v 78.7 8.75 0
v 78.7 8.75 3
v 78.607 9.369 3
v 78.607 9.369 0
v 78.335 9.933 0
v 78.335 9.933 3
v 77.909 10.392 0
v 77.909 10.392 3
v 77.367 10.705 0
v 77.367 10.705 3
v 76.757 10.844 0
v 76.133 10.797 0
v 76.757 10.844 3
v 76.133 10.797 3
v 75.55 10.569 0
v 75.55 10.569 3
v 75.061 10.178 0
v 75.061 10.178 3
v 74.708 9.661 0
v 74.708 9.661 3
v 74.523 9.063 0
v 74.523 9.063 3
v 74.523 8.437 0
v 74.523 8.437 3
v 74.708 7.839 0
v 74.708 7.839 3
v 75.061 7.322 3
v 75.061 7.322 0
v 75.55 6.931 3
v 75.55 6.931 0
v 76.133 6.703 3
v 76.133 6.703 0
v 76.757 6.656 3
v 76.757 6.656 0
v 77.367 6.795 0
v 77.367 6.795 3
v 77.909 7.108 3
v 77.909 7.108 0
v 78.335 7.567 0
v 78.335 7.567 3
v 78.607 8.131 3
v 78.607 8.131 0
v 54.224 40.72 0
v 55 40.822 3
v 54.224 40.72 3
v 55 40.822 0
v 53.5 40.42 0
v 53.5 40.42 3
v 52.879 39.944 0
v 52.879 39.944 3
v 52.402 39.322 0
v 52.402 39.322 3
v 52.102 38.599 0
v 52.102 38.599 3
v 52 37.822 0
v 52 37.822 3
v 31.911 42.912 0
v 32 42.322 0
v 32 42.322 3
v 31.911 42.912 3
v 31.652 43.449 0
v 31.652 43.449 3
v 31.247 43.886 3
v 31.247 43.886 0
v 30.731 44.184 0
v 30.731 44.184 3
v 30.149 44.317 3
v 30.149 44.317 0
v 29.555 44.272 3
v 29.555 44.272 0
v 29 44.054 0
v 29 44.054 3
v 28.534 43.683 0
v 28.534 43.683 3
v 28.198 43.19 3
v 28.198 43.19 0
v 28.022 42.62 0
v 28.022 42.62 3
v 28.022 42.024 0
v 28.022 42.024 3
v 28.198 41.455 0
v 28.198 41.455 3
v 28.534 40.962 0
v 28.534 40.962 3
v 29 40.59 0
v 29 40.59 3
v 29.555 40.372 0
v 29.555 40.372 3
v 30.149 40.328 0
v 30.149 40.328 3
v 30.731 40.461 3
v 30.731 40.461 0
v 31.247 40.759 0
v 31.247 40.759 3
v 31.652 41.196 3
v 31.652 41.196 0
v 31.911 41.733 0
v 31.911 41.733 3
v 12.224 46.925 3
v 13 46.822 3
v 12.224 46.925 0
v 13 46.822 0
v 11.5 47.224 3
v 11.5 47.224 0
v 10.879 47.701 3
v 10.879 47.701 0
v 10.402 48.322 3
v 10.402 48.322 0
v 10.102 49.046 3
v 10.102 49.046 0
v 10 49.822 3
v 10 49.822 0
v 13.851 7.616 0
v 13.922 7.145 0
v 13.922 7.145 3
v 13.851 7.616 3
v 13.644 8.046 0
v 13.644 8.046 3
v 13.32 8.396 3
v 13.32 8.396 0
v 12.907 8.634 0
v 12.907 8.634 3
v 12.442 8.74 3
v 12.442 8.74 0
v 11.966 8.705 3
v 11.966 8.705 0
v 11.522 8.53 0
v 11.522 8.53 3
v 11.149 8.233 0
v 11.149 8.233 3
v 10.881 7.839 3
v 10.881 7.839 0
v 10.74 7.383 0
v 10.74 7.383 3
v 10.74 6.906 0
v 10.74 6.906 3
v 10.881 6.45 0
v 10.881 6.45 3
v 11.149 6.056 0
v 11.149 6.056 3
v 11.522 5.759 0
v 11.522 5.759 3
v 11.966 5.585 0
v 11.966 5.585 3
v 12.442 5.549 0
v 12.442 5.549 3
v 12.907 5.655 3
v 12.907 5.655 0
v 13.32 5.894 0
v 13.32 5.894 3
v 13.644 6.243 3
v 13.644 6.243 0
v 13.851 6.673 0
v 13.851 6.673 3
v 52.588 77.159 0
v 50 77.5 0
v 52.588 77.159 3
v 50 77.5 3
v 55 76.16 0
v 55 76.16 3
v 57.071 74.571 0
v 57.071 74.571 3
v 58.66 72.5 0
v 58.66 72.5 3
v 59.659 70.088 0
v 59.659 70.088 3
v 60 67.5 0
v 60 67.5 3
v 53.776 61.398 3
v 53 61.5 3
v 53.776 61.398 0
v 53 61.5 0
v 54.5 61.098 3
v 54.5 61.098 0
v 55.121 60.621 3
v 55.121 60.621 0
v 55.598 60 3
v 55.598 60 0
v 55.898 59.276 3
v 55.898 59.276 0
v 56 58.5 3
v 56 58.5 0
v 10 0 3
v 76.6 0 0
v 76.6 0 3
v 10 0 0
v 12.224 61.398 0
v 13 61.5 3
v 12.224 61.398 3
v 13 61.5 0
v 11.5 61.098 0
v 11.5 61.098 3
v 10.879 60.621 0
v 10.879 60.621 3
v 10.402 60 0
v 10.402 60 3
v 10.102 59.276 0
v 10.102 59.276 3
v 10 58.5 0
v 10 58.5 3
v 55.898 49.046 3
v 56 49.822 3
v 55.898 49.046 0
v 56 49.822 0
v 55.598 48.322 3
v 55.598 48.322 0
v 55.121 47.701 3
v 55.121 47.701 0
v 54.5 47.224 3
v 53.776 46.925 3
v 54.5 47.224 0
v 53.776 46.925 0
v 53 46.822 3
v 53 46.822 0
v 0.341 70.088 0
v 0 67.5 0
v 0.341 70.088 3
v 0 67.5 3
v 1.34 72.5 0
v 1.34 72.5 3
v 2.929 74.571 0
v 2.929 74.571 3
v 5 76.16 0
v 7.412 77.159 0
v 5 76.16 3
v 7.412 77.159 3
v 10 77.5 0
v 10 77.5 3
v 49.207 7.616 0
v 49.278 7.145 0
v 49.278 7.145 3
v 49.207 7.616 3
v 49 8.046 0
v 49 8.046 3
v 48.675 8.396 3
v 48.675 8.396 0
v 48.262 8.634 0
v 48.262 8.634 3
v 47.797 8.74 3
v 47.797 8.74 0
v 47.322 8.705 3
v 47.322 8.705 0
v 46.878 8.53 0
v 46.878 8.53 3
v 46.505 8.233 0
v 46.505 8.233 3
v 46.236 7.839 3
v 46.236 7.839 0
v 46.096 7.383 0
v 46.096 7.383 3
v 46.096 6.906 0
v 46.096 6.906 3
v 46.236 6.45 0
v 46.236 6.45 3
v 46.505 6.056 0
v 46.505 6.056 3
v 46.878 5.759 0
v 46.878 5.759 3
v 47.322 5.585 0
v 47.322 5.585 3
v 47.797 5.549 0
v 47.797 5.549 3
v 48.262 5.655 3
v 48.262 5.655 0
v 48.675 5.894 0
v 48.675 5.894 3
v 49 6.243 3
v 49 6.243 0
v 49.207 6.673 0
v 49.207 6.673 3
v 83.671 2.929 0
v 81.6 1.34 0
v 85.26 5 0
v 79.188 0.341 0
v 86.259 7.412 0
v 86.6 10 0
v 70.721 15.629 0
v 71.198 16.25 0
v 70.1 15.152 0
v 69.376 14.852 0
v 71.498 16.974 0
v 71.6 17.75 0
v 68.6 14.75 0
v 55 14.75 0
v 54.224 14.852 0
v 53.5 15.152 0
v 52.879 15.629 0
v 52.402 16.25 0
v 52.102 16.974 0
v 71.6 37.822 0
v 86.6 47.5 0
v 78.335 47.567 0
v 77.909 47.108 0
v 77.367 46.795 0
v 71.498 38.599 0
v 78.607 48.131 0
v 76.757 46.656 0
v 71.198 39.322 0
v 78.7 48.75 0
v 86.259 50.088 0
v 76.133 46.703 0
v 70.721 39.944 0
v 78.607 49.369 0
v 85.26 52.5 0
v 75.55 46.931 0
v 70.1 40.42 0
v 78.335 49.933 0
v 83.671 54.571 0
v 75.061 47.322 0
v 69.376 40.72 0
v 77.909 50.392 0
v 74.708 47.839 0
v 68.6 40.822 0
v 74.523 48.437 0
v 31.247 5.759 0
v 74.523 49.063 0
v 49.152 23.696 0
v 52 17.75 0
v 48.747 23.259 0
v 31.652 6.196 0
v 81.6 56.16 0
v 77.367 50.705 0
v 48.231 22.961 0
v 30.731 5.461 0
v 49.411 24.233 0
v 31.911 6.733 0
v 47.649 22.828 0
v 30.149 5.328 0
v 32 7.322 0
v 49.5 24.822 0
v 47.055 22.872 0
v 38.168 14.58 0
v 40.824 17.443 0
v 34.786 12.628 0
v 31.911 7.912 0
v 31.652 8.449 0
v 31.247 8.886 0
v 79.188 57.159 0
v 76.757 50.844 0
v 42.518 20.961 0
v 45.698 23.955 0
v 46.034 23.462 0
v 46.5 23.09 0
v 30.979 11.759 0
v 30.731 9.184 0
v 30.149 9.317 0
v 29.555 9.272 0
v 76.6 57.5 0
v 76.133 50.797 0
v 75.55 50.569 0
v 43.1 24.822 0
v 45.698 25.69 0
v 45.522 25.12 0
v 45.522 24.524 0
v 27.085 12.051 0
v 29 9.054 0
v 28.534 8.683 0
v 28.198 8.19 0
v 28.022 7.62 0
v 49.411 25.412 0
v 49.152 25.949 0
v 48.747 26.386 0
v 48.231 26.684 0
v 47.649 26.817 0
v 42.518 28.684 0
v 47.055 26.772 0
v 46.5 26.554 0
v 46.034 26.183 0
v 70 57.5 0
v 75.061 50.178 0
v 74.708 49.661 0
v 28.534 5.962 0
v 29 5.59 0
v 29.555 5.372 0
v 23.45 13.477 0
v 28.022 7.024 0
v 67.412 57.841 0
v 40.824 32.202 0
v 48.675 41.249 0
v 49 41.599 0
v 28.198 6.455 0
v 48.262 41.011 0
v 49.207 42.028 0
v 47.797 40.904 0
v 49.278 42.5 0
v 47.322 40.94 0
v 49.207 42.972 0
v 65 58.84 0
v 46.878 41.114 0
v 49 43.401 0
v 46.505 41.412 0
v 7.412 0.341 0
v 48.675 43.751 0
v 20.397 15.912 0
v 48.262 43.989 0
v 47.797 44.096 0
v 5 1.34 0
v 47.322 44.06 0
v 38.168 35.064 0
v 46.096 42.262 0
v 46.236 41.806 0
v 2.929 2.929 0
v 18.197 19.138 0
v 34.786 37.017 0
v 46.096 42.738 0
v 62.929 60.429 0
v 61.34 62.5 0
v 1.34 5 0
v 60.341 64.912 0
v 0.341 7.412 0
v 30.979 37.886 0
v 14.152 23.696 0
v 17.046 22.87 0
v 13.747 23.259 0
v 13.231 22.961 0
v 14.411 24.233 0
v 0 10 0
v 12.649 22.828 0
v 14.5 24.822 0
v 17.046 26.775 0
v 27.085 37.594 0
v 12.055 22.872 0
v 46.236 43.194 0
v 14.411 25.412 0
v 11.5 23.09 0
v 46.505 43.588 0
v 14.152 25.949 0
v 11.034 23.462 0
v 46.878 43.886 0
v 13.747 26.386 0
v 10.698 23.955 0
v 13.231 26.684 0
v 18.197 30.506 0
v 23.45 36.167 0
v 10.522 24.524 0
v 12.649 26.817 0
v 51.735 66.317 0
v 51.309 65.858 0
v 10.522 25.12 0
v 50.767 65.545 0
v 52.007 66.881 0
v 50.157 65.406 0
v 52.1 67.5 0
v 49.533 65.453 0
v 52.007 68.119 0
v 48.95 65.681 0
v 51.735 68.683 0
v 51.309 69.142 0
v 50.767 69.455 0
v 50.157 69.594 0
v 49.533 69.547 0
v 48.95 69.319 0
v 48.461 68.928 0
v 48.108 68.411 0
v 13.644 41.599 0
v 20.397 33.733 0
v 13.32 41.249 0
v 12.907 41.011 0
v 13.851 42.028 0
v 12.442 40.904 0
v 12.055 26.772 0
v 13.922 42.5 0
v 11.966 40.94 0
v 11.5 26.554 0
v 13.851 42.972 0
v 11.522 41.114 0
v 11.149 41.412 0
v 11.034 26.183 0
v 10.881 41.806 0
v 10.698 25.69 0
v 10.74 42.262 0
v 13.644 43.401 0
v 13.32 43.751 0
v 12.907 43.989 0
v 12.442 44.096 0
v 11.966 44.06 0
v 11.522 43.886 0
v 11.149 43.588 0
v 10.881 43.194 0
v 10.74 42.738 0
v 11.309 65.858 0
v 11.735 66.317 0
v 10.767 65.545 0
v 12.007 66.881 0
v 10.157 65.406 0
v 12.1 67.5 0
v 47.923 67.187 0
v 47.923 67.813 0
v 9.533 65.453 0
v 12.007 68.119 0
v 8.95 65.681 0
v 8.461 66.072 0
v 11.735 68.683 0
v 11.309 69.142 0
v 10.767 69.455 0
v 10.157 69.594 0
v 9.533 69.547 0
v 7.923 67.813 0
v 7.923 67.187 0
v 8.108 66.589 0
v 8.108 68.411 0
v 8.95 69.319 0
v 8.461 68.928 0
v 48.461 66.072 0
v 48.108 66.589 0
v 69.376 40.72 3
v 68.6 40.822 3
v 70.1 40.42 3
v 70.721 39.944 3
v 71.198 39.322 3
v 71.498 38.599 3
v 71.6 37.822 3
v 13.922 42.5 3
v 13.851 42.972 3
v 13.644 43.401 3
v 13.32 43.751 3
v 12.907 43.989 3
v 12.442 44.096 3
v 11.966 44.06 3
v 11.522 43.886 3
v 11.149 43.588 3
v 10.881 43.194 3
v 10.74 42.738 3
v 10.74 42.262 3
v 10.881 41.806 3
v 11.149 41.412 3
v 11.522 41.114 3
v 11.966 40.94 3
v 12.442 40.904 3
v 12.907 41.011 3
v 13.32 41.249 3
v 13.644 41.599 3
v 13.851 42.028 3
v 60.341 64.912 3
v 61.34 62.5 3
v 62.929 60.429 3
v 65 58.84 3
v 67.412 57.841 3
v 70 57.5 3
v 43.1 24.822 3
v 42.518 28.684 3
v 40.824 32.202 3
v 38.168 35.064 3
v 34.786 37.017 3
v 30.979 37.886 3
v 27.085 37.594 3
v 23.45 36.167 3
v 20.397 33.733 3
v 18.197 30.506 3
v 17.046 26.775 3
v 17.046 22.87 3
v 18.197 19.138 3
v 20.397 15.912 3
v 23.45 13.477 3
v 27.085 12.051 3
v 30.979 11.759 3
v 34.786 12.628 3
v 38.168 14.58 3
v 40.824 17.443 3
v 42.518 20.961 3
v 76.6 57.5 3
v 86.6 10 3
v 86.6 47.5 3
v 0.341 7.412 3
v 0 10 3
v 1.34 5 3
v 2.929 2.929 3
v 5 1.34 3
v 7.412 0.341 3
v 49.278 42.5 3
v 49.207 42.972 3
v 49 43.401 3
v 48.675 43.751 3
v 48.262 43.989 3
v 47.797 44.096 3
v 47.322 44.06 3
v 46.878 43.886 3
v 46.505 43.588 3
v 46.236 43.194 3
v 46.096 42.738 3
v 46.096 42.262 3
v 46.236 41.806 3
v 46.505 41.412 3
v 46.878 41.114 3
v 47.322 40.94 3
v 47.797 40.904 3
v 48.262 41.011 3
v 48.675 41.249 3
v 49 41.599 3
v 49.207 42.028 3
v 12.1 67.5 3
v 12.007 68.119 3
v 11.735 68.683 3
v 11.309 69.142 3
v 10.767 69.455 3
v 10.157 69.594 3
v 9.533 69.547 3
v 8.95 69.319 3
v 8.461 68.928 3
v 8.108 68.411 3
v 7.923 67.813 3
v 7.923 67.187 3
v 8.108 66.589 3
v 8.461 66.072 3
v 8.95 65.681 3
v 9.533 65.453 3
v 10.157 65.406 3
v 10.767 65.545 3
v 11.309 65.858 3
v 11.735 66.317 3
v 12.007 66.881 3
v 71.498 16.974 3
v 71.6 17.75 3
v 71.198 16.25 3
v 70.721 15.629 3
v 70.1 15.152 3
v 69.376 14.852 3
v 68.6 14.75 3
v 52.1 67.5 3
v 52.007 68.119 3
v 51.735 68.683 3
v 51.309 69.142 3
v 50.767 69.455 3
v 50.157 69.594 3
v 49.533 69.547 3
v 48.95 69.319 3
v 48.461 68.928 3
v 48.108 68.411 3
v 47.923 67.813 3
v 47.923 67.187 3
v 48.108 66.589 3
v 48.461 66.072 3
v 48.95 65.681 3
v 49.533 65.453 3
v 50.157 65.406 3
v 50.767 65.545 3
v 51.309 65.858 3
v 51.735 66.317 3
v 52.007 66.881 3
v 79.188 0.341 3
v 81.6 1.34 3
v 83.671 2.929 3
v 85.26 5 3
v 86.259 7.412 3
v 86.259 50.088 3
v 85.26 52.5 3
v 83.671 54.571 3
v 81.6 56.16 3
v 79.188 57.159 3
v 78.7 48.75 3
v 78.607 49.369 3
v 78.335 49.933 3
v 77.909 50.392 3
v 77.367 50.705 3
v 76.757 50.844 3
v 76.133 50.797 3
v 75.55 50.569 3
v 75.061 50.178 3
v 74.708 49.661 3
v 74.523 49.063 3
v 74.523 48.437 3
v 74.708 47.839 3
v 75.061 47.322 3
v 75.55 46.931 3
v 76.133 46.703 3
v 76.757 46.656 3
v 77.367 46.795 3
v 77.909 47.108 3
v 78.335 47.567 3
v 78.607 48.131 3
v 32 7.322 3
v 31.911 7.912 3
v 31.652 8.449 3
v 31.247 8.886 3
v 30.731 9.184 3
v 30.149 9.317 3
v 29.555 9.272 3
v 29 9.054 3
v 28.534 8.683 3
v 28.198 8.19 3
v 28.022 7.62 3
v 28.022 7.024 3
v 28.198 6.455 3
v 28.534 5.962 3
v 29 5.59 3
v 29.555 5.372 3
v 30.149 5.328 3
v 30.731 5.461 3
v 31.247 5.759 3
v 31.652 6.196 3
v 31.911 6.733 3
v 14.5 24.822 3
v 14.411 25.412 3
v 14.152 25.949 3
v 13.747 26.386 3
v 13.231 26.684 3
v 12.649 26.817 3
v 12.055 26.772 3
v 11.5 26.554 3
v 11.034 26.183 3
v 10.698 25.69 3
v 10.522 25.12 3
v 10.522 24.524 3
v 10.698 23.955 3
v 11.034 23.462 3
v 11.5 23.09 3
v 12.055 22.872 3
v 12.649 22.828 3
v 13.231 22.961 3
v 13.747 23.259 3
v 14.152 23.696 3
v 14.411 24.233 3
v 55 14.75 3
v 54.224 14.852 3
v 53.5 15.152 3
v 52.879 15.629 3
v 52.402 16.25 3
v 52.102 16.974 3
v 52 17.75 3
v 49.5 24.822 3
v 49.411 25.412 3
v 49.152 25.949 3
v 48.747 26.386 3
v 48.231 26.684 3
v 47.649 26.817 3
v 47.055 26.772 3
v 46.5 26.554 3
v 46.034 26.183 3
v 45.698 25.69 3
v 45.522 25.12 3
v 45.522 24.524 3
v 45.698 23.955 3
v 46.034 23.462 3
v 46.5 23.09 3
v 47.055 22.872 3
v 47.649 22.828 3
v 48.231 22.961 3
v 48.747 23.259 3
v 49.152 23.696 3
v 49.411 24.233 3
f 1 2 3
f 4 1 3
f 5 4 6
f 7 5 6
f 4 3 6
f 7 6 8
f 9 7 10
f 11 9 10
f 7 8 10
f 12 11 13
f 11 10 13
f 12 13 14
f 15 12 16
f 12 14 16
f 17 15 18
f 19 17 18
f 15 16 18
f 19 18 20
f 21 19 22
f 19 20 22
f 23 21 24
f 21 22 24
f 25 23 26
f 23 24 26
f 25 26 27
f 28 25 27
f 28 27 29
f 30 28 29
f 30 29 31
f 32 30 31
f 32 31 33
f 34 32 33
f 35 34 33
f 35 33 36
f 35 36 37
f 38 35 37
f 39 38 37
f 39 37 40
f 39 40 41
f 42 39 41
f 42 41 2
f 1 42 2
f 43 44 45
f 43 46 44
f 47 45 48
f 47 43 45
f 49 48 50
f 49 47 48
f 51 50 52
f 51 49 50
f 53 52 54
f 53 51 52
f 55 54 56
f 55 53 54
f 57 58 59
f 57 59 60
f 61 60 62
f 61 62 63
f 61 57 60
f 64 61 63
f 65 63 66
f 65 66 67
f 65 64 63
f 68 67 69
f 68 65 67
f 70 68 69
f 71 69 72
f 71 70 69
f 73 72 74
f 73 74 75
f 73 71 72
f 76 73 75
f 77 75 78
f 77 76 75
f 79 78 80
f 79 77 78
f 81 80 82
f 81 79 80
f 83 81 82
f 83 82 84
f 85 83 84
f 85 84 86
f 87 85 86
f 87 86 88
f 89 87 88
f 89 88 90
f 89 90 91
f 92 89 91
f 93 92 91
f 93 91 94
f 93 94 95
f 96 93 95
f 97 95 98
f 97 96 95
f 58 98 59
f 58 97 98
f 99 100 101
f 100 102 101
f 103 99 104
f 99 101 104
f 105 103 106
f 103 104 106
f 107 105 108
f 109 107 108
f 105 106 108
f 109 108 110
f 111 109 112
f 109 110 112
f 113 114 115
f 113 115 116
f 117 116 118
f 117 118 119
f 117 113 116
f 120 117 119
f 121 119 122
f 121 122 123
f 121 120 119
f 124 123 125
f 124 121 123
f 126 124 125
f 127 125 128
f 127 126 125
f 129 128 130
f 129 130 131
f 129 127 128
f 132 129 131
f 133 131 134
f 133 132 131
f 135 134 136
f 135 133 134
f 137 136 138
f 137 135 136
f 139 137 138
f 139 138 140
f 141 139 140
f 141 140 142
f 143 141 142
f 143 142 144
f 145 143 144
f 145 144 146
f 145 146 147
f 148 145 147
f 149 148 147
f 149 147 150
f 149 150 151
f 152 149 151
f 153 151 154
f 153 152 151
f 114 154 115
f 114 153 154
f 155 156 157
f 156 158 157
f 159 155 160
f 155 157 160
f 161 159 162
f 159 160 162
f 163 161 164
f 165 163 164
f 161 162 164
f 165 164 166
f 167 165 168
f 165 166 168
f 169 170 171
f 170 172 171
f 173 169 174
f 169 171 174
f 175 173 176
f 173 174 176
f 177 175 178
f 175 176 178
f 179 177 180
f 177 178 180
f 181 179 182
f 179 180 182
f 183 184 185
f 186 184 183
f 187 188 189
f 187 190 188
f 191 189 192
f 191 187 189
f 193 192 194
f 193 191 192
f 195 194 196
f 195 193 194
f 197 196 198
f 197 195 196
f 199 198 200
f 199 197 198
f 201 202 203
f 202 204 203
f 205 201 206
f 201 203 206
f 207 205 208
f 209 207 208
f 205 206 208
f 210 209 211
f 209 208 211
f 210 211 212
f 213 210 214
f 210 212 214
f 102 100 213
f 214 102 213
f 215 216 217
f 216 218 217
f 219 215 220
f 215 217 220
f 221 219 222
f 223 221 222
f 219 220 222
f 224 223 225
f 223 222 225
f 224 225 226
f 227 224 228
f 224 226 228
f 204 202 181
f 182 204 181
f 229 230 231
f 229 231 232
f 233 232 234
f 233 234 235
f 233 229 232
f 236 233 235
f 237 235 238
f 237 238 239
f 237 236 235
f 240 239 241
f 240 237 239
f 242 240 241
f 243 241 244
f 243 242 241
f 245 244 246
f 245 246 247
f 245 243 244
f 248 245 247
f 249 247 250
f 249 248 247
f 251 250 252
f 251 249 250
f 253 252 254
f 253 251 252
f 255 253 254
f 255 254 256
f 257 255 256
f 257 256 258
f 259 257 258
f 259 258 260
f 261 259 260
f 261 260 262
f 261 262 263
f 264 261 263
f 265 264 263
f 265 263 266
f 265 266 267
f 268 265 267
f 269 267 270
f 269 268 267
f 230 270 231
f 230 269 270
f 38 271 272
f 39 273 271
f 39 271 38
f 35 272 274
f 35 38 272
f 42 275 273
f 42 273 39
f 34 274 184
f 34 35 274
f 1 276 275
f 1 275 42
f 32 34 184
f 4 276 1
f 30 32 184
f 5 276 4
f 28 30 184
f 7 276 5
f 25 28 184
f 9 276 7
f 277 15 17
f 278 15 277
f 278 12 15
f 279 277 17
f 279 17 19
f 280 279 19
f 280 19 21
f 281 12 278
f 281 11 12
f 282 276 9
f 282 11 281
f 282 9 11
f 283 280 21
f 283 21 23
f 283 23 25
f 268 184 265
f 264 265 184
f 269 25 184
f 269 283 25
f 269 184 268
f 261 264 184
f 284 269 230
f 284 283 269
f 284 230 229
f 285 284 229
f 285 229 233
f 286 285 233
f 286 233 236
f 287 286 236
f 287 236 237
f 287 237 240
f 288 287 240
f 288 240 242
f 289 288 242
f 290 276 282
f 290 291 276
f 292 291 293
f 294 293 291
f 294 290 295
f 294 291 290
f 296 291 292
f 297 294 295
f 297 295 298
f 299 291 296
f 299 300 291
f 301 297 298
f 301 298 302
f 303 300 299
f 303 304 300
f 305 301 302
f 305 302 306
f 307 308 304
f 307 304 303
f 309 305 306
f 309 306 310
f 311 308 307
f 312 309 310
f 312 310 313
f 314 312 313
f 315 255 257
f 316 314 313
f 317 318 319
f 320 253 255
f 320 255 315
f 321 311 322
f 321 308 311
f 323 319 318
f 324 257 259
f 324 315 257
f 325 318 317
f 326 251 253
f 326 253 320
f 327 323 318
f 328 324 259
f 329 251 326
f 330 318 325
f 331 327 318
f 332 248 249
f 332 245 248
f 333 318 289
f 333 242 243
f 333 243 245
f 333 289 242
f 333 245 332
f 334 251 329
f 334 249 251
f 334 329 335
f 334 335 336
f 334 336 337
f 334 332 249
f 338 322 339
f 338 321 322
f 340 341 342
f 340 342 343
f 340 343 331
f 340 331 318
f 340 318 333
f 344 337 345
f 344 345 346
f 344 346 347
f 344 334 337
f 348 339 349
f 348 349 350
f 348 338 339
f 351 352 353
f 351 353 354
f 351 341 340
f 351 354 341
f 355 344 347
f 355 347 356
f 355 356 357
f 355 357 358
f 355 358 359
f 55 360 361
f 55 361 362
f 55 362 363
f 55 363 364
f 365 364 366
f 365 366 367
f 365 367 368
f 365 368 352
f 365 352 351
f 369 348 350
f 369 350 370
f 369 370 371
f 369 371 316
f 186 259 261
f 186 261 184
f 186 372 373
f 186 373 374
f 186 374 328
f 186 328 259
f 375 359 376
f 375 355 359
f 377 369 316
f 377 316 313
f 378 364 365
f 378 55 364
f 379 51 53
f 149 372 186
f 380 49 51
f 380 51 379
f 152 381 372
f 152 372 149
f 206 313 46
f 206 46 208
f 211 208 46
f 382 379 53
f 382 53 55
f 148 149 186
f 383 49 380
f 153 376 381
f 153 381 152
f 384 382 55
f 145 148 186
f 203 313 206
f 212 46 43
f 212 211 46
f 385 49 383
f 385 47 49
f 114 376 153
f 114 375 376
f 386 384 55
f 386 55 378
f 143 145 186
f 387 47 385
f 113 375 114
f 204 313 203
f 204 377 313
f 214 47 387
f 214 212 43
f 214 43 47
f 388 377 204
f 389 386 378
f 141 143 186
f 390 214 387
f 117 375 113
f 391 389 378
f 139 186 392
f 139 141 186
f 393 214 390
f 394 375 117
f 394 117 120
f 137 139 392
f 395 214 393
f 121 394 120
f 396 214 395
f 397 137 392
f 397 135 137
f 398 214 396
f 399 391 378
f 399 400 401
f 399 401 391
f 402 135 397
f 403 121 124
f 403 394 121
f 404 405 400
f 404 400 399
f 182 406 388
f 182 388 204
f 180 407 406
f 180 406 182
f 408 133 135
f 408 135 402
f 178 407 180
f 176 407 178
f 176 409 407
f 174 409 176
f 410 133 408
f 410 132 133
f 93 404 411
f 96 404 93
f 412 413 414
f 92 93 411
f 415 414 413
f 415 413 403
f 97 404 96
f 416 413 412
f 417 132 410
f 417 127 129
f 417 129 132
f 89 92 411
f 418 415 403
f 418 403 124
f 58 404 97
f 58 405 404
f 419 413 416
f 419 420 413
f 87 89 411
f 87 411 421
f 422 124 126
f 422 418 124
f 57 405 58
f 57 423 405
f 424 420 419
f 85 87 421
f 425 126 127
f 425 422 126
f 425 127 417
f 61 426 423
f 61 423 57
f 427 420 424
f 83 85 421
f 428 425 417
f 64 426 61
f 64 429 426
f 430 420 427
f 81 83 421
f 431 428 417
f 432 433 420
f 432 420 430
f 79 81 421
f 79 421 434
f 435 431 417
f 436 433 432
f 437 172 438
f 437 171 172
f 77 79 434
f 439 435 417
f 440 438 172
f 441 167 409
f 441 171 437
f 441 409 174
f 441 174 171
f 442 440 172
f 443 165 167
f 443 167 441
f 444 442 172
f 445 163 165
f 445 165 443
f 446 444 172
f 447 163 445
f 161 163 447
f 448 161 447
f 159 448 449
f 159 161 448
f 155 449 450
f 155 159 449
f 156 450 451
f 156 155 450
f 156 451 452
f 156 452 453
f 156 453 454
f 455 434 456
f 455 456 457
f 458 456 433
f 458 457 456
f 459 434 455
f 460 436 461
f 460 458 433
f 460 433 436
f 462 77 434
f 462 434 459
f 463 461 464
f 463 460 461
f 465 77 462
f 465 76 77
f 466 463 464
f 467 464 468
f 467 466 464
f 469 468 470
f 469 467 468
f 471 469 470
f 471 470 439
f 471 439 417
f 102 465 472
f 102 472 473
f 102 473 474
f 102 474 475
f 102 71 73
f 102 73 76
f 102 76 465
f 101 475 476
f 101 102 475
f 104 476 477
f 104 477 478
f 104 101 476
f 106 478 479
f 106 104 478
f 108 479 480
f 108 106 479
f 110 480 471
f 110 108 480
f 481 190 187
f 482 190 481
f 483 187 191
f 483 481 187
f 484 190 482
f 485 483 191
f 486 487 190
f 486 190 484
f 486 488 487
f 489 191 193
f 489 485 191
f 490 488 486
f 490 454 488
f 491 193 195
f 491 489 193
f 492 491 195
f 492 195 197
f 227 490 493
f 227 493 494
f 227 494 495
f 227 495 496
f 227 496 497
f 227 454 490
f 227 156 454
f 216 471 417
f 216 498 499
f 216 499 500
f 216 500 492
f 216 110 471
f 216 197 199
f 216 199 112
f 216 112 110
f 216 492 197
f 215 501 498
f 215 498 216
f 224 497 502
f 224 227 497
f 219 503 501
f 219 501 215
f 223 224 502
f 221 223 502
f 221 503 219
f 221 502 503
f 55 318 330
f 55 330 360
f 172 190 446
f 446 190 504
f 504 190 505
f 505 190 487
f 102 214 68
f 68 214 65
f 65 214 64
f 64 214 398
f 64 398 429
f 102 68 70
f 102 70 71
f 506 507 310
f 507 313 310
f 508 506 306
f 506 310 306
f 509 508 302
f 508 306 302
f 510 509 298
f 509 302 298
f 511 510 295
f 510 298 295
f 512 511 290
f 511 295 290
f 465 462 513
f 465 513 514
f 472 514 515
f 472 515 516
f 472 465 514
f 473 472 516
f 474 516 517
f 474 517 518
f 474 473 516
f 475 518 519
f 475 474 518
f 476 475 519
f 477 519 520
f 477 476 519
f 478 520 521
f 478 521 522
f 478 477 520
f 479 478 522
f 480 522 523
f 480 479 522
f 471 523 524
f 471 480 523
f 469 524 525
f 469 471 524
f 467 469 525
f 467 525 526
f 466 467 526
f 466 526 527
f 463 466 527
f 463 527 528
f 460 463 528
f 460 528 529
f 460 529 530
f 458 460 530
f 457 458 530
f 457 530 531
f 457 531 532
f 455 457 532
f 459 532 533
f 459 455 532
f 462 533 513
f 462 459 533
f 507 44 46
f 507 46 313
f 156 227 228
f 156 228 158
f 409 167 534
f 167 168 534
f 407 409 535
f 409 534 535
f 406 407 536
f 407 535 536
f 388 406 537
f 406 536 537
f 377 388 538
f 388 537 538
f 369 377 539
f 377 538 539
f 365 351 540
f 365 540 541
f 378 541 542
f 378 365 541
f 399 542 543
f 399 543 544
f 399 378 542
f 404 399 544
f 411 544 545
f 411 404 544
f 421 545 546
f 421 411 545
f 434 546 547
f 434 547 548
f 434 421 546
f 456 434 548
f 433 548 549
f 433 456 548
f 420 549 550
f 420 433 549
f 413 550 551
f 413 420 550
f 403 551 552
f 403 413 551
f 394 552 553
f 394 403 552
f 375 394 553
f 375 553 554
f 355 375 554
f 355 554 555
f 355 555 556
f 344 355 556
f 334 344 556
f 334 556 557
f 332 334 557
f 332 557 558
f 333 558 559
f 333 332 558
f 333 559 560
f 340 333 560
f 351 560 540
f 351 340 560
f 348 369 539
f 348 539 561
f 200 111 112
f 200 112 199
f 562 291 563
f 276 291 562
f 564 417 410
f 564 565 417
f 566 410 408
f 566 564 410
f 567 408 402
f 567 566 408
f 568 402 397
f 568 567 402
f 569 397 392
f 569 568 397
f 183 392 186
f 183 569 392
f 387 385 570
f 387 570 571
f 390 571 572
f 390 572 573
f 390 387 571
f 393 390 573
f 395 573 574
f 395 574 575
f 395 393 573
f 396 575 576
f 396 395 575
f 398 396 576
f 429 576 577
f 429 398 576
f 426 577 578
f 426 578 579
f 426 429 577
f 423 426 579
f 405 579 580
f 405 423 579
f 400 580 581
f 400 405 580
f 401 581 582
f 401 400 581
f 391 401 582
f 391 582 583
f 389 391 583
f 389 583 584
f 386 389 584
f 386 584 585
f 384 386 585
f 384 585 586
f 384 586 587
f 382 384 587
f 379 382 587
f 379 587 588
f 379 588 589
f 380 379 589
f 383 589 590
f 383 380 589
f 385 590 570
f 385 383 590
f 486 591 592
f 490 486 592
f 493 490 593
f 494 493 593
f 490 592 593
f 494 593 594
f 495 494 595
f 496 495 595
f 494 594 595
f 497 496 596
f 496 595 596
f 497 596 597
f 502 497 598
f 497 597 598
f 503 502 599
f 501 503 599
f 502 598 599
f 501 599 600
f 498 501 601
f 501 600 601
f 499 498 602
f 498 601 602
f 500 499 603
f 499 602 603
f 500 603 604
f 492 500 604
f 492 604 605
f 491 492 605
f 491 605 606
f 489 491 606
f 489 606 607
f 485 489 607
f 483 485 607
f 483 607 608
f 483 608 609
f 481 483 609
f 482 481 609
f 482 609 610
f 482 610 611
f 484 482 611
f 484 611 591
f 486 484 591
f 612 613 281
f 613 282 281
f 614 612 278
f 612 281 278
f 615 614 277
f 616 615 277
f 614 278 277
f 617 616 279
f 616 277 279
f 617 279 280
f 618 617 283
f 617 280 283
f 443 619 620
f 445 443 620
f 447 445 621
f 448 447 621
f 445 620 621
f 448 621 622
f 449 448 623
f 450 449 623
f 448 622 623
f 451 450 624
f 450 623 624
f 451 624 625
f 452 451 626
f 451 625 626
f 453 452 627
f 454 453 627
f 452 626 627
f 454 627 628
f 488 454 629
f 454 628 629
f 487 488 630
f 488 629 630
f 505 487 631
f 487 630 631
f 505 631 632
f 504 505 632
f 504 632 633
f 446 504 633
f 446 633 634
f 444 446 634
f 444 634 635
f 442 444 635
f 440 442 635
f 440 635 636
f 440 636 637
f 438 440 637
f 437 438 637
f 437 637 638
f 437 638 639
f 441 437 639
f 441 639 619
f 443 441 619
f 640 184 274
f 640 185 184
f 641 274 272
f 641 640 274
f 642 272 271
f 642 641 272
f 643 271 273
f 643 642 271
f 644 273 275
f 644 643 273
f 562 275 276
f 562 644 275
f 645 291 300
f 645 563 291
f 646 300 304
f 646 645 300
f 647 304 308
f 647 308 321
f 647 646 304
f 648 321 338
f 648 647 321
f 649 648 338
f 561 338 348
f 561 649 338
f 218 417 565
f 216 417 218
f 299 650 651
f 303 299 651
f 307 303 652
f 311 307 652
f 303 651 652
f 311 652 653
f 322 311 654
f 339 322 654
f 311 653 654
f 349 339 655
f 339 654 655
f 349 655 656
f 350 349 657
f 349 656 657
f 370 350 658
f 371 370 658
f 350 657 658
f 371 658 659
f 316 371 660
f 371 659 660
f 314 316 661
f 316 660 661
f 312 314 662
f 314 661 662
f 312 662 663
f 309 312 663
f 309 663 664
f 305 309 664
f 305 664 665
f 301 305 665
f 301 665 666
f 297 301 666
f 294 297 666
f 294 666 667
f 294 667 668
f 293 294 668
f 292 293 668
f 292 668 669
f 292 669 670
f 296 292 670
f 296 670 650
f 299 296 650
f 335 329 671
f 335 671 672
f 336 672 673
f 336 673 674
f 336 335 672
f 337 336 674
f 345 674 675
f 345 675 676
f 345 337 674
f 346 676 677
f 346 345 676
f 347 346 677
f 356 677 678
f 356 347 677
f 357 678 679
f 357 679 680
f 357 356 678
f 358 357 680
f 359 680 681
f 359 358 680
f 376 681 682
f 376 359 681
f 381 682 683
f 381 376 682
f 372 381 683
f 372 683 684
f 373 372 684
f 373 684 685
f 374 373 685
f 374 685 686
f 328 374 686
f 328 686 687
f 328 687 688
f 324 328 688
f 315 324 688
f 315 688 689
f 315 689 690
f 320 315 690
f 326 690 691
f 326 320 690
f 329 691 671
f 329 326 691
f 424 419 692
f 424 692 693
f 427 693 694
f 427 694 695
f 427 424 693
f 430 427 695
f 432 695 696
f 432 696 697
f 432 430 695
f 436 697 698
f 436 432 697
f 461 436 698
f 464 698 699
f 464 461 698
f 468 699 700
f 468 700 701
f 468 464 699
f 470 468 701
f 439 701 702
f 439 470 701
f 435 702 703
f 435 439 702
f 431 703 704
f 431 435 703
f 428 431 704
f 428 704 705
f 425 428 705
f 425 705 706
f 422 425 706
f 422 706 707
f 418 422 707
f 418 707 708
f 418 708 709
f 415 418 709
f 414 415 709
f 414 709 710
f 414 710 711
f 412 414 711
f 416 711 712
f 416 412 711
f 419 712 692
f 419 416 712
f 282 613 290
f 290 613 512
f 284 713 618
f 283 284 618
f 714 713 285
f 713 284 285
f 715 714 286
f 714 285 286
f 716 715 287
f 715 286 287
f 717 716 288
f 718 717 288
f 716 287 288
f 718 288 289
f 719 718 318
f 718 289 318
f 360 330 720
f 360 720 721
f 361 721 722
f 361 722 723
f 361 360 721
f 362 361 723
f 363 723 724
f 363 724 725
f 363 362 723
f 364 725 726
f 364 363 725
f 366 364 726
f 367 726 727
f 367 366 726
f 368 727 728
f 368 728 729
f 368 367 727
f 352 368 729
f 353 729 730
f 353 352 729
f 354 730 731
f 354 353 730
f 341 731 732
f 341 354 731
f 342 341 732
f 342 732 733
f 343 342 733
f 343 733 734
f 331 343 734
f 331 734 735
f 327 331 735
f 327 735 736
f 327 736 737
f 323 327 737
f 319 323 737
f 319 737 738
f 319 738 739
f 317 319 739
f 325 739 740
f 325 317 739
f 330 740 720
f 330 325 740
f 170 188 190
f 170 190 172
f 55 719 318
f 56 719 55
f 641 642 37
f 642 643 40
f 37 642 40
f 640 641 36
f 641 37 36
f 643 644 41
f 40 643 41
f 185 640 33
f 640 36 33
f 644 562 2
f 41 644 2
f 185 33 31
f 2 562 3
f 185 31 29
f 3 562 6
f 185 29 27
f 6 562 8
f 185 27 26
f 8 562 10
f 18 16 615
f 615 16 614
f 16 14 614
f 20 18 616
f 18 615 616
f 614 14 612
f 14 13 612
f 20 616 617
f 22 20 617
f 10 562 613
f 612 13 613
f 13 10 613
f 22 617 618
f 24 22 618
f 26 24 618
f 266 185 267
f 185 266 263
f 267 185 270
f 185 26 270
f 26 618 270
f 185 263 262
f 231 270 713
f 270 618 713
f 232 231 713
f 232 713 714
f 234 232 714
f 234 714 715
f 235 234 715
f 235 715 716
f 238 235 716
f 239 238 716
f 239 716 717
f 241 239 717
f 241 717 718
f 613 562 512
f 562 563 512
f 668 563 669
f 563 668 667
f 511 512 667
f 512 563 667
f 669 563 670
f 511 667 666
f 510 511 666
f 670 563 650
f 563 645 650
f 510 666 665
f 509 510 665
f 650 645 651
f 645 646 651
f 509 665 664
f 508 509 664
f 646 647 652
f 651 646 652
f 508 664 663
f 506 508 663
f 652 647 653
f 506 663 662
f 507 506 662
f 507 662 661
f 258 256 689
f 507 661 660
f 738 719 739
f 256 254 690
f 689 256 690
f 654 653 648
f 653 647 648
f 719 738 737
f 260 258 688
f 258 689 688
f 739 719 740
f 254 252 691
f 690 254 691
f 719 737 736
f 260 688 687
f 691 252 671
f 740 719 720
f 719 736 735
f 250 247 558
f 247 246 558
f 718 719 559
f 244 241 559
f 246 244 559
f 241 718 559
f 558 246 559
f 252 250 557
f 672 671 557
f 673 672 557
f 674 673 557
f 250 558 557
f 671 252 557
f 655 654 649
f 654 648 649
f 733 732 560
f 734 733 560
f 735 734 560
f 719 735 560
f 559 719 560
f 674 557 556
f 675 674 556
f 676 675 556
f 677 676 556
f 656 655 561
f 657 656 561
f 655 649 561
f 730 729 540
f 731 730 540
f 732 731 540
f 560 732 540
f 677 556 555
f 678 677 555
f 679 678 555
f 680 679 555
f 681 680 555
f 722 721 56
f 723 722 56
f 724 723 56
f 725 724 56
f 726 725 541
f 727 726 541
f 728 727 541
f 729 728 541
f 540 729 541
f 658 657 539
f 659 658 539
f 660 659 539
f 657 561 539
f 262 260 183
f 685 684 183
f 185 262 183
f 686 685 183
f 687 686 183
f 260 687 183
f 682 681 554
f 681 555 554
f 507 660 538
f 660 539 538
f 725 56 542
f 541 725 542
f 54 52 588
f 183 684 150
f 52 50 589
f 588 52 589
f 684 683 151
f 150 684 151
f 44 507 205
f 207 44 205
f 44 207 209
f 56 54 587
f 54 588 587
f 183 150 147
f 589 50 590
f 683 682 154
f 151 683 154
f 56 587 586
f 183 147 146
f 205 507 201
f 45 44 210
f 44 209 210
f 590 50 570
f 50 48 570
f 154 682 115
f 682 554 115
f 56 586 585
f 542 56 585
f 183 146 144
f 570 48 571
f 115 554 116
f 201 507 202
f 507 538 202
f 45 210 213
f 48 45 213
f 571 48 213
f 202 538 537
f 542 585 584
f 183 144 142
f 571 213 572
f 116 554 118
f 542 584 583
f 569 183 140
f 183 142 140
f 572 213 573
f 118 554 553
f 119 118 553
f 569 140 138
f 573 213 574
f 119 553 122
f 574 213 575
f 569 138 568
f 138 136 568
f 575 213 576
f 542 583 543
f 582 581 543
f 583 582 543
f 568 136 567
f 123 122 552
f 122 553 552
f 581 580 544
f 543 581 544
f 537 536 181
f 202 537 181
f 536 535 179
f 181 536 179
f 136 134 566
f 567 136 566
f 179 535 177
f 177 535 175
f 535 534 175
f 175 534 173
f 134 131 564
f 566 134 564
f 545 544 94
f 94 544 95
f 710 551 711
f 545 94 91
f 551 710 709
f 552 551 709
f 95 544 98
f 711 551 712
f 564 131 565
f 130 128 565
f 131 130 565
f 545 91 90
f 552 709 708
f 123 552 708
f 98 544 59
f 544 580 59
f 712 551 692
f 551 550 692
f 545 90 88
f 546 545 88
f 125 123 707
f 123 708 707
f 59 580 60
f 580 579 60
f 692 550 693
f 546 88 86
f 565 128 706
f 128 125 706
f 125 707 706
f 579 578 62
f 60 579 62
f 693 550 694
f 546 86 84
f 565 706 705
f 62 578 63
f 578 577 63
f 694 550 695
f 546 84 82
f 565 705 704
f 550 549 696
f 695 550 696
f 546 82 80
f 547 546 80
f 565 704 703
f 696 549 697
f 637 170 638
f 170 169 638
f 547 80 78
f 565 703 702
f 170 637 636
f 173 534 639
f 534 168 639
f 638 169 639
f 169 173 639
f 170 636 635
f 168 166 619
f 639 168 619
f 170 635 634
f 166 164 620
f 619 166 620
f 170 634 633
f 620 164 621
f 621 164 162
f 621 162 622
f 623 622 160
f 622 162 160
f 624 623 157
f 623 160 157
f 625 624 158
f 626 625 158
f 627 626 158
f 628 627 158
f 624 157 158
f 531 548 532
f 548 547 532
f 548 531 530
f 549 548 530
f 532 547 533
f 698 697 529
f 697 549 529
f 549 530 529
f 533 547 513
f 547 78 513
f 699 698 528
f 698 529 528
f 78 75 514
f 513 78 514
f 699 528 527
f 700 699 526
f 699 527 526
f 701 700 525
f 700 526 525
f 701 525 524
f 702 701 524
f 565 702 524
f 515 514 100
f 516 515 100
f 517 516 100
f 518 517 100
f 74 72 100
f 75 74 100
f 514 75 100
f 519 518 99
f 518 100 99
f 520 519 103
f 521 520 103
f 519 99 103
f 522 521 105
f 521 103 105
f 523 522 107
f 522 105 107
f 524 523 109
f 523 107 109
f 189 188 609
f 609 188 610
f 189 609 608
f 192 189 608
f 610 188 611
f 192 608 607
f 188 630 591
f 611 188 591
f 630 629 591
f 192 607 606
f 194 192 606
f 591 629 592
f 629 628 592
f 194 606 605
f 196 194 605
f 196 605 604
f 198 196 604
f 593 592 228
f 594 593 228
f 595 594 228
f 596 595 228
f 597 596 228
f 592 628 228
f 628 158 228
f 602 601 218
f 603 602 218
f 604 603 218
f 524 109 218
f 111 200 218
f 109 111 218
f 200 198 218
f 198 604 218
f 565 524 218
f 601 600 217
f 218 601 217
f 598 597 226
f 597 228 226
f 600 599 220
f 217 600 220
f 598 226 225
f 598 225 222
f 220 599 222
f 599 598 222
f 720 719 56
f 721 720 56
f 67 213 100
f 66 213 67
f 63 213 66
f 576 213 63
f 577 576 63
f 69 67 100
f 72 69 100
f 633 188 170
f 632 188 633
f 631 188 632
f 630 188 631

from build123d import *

# Parameters (mm, degrees)
SKETCH_1_R          = 1.6
SKETCH_1_R_2        = 2
SKETCH_1_R_3        = 13.1
EXTRUDE_1_DEPTH     = 3
SKETCH_2_R          = 2.1
CUT_EXTRUDE_1_DEPTH = 117.253215009
FILLET_1_R          = 10
SKETCH_4_W          = 19.6
SKETCH_4_H          = 26.07233047
SKETCH_4_W_2        = 46
SKETCH_4_H_2        = 14.67766953
CUT_EXTRUDE_2_DEPTH = 117.253215009
FILLET_2_R          = 3


with BuildPart() as part:
    # 草图1 → 凸台-拉伸1 (new body)
    with BuildSketch(Plane.XY):
        Polygon((0, 0), (0, 77.5), (60, 77.5), (60, 57.5), (86.6, 57.5), (86.6, 0), align=None)
        with Locations((12.32233047, 42.5)):
            Circle(SKETCH_1_R, mode=Mode.SUBTRACT)
        with Locations((30, 42.32233047)):
            Circle(SKETCH_1_R_2, mode=Mode.SUBTRACT)
        with Locations((30, 24.82233047)):
            Circle(SKETCH_1_R_3, mode=Mode.SUBTRACT)
        with Locations((12.5, 24.82233047)):
            Circle(SKETCH_1_R_2, mode=Mode.SUBTRACT)
        with Locations((12.32233047, 7.144660941)):
            Circle(SKETCH_1_R, mode=Mode.SUBTRACT)
        with Locations((30, 7.32233047)):
            Circle(SKETCH_1_R_2, mode=Mode.SUBTRACT)
        with Locations((47.67766953, 7.144660941)):
            Circle(SKETCH_1_R, mode=Mode.SUBTRACT)
        with Locations((47.5, 24.82233047)):
            Circle(SKETCH_1_R_2, mode=Mode.SUBTRACT)
        with Locations((47.67766953, 42.5)):
            Circle(SKETCH_1_R, mode=Mode.SUBTRACT)
    extrude(amount=EXTRUDE_1_DEPTH)

    # 草图2 → 切除-拉伸1 (cut, through all)
    with BuildSketch(Plane.XY.offset(3)):
        with Locations((10, 67.5)):
            Circle(SKETCH_2_R)
        with Locations((50, 67.5)):
            Circle(SKETCH_2_R)
        with Locations((76.6, 48.75)):
            Circle(SKETCH_2_R)
        with Locations((76.6, 8.75)):
            Circle(SKETCH_2_R)
    extrude(amount=-CUT_EXTRUDE_1_DEPTH, mode=Mode.SUBTRACT)

    # 圆角1
    fillet_1_edges = [part.edges().sort_by_distance(p)[0] for p in [
        (0, 77.5, 1.5),
        (0, 0, 1.5),
        (86.6, 0, 1.5),
        (86.6, 57.5, 1.5),
        (60, 77.5, 1.5),
        (60, 57.5, 1.5),
    ]]
    fillet(fillet_1_edges, radius=FILLET_1_R - 0.0001)  # a hair under: the kernel refuses the full size

    # 草图4 → 切除-拉伸2 (cut, through all)
    with BuildSketch(Plane.XY.offset(3)):
        with Locations((61.8, 27.786165235)):
            Rectangle(SKETCH_4_W, SKETCH_4_H)
        with Locations((33, 54.161165235)):
            Rectangle(SKETCH_4_W_2, SKETCH_4_H_2)
    extrude(amount=-CUT_EXTRUDE_2_DEPTH, mode=Mode.SUBTRACT)

    # 圆角2
    fillet_2_edges = [part.edges().sort_by_distance(p)[0] for p in [
        (56, 46.82233047, 1.5),
        (10, 46.82233047, 1.5),
        (10, 61.5, 1.5),
        (56, 61.5, 1.5),
        (52, 14.75, 1.5),
        (52, 40.82233047, 1.5),
        (71.6, 40.82233047, 1.5),
        (71.6, 14.75, 1.5),
    ]]
    fillet(fillet_2_edges, radius=FILLET_2_R)


solid = part.part
